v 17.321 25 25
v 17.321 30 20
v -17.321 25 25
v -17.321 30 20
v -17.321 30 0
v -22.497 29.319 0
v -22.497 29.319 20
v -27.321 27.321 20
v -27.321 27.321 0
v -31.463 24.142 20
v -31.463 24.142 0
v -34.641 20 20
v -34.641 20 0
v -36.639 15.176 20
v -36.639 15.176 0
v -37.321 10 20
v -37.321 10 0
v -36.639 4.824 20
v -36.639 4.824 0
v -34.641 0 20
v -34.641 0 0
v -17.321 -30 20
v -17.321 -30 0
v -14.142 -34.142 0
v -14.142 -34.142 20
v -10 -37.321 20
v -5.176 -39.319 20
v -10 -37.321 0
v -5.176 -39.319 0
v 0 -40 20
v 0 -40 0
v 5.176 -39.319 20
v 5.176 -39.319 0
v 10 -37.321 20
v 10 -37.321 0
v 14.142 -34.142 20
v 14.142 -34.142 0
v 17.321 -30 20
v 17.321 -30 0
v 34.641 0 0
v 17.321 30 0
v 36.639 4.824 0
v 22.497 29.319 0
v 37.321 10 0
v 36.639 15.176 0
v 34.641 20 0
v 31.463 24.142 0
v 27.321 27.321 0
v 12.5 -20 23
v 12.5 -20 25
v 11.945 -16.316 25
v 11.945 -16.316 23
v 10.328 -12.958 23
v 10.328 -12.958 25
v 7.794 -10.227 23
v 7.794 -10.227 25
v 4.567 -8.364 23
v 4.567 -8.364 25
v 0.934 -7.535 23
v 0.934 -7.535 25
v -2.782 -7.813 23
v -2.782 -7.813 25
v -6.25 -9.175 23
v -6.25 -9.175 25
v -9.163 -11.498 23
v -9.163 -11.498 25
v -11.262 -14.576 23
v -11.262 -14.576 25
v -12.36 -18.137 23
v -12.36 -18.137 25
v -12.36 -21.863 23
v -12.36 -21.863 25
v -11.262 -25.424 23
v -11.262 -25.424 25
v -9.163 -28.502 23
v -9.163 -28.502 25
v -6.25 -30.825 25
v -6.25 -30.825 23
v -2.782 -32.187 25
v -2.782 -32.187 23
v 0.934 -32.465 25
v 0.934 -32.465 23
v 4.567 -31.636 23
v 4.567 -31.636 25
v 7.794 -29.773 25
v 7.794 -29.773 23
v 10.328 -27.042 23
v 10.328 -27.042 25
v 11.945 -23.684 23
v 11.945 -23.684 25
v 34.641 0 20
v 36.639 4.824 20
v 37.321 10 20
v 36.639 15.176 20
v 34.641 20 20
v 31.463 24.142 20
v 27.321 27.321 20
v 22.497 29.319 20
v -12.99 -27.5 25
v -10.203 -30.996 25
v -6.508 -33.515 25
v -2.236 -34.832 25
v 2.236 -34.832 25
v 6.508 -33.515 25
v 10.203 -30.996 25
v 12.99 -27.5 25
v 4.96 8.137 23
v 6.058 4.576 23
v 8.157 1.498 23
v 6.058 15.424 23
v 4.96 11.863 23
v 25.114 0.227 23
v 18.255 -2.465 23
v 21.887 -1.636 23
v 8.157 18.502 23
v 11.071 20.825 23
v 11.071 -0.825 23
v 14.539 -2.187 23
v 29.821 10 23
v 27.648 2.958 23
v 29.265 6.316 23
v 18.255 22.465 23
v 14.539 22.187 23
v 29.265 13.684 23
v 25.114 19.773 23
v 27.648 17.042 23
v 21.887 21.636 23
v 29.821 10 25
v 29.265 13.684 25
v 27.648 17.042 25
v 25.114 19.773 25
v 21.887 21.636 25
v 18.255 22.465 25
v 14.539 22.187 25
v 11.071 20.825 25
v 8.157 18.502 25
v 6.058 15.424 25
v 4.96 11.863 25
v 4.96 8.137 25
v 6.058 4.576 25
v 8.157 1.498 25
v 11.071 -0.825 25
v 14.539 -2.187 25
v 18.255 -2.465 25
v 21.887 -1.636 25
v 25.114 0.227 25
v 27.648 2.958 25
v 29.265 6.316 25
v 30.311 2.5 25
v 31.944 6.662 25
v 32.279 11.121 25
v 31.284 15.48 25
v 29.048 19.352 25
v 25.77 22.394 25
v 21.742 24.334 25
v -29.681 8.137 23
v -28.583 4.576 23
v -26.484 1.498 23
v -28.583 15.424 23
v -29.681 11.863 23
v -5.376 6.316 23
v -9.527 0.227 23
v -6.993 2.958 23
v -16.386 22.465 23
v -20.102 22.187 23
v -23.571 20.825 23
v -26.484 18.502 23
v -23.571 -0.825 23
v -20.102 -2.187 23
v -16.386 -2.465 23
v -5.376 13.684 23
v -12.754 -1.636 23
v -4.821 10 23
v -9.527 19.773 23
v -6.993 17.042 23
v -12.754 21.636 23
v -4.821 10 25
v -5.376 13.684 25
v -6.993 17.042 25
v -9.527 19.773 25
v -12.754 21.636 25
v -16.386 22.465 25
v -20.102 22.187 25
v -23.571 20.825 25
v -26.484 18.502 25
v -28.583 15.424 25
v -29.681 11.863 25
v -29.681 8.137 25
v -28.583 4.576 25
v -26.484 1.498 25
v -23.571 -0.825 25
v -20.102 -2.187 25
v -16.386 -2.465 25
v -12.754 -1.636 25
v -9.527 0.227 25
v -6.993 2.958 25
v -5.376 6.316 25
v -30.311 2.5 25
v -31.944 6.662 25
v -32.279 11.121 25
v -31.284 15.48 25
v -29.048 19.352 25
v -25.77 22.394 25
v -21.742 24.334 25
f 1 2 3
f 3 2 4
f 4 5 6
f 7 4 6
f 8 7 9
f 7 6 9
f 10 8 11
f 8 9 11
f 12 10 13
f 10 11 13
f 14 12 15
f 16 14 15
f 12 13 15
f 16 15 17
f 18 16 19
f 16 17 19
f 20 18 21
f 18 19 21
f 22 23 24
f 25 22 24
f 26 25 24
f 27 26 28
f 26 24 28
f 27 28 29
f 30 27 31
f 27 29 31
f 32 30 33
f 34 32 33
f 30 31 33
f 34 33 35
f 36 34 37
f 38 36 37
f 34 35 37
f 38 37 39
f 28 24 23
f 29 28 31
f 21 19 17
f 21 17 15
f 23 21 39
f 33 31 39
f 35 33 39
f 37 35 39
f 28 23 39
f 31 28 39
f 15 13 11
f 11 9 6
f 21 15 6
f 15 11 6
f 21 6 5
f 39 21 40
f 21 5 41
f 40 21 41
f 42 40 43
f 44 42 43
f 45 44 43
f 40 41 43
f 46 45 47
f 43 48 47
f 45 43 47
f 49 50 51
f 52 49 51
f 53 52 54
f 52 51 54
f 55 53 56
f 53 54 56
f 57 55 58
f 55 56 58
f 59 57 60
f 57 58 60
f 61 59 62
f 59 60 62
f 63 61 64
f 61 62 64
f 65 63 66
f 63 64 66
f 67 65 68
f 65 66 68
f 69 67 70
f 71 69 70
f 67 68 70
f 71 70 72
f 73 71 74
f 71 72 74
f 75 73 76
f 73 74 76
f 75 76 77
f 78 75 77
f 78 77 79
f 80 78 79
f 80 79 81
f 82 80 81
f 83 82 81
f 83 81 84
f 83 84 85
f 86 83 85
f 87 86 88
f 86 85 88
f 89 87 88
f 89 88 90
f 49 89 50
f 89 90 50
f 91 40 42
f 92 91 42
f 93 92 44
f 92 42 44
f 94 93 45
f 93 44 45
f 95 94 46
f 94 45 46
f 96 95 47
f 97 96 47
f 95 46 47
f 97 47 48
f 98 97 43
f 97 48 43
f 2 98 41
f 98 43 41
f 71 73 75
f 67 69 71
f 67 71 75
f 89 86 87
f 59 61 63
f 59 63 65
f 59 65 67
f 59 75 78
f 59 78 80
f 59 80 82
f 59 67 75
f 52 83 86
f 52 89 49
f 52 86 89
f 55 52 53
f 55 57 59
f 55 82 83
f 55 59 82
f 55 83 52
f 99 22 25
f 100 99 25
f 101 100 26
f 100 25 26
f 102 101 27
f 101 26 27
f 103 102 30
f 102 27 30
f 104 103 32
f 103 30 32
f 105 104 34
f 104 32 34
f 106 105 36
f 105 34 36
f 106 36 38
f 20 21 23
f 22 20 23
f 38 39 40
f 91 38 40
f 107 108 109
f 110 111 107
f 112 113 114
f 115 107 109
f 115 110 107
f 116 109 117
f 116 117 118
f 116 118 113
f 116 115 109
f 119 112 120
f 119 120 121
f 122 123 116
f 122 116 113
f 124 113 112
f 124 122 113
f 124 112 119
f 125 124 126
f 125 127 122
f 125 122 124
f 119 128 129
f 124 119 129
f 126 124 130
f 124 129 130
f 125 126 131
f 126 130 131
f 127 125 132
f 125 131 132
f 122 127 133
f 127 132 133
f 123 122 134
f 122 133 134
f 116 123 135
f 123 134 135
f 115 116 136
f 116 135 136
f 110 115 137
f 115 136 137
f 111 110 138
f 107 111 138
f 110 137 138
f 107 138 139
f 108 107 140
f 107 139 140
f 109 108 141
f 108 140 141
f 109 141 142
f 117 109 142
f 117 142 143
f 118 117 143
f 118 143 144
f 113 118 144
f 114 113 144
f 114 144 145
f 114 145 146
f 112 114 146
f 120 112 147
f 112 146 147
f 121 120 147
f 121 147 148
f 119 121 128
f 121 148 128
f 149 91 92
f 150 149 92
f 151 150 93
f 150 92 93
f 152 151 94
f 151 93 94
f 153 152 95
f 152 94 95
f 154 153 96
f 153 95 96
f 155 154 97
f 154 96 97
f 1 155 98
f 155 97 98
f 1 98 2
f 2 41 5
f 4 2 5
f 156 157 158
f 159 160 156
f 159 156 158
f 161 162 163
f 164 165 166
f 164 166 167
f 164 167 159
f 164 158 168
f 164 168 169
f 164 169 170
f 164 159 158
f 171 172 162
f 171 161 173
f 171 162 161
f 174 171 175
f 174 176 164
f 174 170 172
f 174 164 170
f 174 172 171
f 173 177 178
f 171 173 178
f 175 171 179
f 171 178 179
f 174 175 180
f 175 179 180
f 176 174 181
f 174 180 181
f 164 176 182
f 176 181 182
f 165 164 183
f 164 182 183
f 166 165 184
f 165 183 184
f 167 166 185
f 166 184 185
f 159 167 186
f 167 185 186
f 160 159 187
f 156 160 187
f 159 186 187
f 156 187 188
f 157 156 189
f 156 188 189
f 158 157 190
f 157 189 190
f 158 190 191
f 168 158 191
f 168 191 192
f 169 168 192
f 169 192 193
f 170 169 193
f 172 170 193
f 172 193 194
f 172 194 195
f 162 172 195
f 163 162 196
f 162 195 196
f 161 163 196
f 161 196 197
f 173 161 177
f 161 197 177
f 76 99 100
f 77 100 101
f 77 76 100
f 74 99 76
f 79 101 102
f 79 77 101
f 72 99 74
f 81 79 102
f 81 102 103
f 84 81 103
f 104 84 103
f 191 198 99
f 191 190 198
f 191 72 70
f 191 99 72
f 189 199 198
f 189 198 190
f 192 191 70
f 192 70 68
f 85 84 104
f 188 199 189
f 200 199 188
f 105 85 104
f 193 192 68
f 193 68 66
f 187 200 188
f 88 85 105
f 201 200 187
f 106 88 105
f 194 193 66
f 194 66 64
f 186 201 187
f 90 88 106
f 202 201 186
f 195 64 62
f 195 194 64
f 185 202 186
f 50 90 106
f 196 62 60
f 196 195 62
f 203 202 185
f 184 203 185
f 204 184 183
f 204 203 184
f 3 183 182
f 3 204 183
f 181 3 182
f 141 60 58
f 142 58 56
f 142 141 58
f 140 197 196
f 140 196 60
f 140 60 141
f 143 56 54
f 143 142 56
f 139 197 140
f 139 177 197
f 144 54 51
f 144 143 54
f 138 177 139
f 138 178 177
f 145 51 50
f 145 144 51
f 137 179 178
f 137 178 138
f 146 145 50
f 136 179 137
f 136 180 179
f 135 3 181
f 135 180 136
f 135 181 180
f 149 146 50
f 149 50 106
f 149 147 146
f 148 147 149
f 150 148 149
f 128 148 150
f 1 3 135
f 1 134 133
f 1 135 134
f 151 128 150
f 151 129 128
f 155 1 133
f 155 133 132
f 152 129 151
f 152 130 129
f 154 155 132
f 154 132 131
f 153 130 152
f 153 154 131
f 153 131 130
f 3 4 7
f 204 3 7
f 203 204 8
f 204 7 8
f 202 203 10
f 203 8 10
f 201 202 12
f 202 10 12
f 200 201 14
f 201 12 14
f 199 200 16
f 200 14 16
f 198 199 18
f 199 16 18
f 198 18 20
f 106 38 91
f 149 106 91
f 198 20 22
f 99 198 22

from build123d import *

# Parameters (mm, degrees)
F1_DEPTH = 25
F2_R     = 12.5
F3_DEPTH = 2
F4_SIZE  = 5


with BuildPart() as f1:
    # F0 (on Top) → F1 (new body)
    with BuildSketch(Plane.XY):
        with BuildLine():
            Line((17.320508, 30), (-17.320508, 30))
            ThreePointArc((-17.320508, 30), (-34.641016, 20), (-34.641016, 0))
            Line((-34.641016, 0), (-17.320508, -30))
            ThreePointArc((-17.320508, -30), (0, -40), (17.320508, -30))
            Line((17.320508, -30), (34.641016, 0))
            ThreePointArc((34.641016, 0), (34.641016, 20), (17.320508, 30))
        make_face()
    extrude(amount=F1_DEPTH)

    # F2 (on face) → F3 (cut)
    with BuildSketch(Plane.XY.offset(25)):
        with Locations((-17.320508, 10)):
            Circle(F2_R)
        with Locations((0, -20)):
            Circle(F2_R)
        with Locations((17.320508, 10)):
            Circle(F2_R)
    extrude(amount=-F3_DEPTH, mode=Mode.SUBTRACT)

    # F4
    f4_edges = [f1.edges().sort_by_distance(p)[0] for p in [
        (25.980762, -15, 25),
    ]]
    chamfer(f4_edges, length=F4_SIZE)


solid = f1.part
